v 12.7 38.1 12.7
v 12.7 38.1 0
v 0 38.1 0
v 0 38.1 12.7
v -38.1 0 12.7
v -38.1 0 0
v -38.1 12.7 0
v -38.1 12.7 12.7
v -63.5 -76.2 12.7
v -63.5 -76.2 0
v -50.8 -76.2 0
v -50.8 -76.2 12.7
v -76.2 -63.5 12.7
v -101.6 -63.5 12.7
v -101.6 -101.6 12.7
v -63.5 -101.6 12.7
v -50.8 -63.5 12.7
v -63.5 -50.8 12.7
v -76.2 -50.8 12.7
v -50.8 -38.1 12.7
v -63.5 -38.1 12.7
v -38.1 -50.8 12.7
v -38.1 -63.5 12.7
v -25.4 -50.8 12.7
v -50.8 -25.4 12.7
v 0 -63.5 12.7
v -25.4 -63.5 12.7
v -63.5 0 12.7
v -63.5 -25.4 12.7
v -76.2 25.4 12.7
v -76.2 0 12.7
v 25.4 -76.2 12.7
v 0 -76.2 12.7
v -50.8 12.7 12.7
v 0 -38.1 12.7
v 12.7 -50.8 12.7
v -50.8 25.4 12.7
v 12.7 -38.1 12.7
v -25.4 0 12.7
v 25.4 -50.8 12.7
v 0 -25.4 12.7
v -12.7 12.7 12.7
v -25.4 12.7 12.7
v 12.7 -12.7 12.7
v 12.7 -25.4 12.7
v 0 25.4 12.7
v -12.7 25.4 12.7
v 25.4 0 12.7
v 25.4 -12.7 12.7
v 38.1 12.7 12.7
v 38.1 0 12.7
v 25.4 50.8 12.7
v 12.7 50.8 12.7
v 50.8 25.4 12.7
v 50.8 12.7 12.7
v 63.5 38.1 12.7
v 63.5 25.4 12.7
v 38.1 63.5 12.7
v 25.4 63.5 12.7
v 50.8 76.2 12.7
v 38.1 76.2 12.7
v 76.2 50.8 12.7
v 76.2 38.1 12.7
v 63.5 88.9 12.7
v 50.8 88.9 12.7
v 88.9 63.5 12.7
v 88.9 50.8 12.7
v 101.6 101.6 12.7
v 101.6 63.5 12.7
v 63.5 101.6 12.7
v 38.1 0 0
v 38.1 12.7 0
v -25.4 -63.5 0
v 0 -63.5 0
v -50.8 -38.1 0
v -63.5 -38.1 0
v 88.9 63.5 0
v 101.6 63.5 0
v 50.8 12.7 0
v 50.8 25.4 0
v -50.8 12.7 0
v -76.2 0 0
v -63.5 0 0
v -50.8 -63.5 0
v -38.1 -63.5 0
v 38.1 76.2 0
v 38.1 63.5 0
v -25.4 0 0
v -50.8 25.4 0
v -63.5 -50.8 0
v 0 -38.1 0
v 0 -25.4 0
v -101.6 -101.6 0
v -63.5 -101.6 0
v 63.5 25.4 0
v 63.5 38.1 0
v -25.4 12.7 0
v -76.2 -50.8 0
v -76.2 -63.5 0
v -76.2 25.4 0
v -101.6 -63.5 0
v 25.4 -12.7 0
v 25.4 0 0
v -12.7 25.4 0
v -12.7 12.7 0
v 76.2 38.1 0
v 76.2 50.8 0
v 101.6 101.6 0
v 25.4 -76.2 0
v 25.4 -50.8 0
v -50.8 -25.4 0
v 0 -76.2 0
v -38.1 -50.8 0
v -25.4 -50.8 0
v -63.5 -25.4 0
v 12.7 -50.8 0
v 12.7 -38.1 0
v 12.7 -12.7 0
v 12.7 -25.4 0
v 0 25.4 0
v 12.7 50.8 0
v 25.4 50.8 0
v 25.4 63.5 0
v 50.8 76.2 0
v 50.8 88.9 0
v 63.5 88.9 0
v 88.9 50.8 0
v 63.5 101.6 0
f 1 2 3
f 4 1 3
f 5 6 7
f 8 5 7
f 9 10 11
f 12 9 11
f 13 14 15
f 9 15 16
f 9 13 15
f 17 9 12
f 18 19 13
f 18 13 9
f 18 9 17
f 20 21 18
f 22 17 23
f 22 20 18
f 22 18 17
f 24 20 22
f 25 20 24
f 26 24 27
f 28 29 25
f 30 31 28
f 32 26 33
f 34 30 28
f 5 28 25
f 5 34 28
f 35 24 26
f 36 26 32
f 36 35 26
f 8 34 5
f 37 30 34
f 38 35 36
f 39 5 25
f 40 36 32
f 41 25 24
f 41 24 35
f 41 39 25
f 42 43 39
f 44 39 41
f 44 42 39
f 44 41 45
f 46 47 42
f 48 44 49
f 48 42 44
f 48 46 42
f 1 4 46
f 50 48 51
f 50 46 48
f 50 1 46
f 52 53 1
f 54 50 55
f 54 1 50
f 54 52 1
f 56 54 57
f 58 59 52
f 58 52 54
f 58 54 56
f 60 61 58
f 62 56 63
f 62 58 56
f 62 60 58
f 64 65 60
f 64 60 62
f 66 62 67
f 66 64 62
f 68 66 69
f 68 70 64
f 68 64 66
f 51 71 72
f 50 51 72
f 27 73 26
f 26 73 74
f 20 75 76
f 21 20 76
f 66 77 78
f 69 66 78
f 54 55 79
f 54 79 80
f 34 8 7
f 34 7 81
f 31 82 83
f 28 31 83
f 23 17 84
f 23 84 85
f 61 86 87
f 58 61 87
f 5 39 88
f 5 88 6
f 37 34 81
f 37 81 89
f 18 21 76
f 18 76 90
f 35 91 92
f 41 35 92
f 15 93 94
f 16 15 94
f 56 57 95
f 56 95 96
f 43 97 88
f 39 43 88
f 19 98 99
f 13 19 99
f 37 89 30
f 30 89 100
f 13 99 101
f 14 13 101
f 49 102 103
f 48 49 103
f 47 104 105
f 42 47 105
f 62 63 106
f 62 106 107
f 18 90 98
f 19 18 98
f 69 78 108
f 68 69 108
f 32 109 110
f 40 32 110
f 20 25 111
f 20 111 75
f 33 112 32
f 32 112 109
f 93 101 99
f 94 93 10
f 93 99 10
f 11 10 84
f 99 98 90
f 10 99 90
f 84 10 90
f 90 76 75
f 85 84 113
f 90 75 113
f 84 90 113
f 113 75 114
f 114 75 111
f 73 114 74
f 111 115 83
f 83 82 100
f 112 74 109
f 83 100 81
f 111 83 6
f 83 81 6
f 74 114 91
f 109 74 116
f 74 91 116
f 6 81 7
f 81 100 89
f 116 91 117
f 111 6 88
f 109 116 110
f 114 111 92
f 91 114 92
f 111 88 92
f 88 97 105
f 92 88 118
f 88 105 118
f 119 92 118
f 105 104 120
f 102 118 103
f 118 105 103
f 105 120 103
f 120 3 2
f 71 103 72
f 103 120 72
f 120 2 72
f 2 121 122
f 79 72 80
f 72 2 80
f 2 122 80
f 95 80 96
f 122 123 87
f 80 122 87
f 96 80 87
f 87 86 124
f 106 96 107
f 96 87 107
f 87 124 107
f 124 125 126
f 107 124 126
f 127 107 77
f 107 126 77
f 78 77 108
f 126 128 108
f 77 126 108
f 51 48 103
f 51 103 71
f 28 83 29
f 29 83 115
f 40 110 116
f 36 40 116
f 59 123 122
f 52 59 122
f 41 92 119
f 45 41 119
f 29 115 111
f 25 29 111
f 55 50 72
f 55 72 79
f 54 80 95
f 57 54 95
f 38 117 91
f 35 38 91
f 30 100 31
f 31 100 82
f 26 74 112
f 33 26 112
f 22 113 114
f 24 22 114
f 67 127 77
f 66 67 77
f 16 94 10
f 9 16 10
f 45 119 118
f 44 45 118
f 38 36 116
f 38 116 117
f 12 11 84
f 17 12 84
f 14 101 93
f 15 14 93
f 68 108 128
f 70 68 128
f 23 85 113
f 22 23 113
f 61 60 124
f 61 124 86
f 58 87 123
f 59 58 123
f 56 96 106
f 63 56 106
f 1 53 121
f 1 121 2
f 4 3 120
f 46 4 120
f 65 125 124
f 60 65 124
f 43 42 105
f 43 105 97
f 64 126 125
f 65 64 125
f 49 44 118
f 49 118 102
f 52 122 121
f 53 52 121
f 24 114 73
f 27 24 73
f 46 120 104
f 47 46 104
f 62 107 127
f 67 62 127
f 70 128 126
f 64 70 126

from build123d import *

# Parameters (mm, degrees)
F1_DEPTH = 12.7


with BuildPart() as f1:
    # F0 (on Top) → F1 (new body)
    with BuildSketch(Plane.XY):
        Polygon((12.7, -12.7), (25.4, -12.7), (25.4, 0), (38.1, 0), (38.1, 12.7), (50.8, 12.7), (50.8, 25.4), (63.5, 25.4), (63.5, 38.1), (76.2, 38.1), (76.2, 50.8), (88.9, 50.8), (88.9, 63.5), (101.6, 63.5), (101.6, 101.6), (88.9, 101.6), (76.2, 101.6), (63.5, 101.6), (63.5, 88.9), (50.8, 88.9), (50.8, 76.2), (38.1, 76.2), (38.1, 63.5), (25.4, 63.5), (25.4, 50.8), (12.7, 50.8), (12.7, 38.1), (0, 38.1), (0, 25.4), (-12.7, 25.4), (-12.7, 12.7), (-25.4, 12.7), (-25.4, 0), (-38.1, 0), (-38.1, 12.7), (-50.8, 12.7), (-50.8, 25.4), (-76.2, 25.4), (-76.2, 0), (-63.5, 0), (-63.5, -25.4), (-50.8, -25.4), (-50.8, -38.1), (-63.5, -38.1), (-63.5, -50.8), (-76.2, -50.8), (-76.2, -63.5), (-101.6, -63.5), (-101.6, -76.2), (-101.6, -88.9), (-101.6, -101.6), (-63.5, -101.6), (-63.5, -76.2), (-50.8, -76.2), (-50.8, -63.5), (-38.1, -63.5), (-38.1, -50.8), (-25.4, -50.8), (-25.4, -63.5), (0, -63.5), (0, -76.2), (25.4, -76.2), (25.4, -63.5), (25.4, -50.8), (12.7, -50.8), (12.7, -38.1), (0, -38.1), (0, -25.4), (12.7, -25.4), align=None)
    extrude(amount=F1_DEPTH)


solid = f1.part
